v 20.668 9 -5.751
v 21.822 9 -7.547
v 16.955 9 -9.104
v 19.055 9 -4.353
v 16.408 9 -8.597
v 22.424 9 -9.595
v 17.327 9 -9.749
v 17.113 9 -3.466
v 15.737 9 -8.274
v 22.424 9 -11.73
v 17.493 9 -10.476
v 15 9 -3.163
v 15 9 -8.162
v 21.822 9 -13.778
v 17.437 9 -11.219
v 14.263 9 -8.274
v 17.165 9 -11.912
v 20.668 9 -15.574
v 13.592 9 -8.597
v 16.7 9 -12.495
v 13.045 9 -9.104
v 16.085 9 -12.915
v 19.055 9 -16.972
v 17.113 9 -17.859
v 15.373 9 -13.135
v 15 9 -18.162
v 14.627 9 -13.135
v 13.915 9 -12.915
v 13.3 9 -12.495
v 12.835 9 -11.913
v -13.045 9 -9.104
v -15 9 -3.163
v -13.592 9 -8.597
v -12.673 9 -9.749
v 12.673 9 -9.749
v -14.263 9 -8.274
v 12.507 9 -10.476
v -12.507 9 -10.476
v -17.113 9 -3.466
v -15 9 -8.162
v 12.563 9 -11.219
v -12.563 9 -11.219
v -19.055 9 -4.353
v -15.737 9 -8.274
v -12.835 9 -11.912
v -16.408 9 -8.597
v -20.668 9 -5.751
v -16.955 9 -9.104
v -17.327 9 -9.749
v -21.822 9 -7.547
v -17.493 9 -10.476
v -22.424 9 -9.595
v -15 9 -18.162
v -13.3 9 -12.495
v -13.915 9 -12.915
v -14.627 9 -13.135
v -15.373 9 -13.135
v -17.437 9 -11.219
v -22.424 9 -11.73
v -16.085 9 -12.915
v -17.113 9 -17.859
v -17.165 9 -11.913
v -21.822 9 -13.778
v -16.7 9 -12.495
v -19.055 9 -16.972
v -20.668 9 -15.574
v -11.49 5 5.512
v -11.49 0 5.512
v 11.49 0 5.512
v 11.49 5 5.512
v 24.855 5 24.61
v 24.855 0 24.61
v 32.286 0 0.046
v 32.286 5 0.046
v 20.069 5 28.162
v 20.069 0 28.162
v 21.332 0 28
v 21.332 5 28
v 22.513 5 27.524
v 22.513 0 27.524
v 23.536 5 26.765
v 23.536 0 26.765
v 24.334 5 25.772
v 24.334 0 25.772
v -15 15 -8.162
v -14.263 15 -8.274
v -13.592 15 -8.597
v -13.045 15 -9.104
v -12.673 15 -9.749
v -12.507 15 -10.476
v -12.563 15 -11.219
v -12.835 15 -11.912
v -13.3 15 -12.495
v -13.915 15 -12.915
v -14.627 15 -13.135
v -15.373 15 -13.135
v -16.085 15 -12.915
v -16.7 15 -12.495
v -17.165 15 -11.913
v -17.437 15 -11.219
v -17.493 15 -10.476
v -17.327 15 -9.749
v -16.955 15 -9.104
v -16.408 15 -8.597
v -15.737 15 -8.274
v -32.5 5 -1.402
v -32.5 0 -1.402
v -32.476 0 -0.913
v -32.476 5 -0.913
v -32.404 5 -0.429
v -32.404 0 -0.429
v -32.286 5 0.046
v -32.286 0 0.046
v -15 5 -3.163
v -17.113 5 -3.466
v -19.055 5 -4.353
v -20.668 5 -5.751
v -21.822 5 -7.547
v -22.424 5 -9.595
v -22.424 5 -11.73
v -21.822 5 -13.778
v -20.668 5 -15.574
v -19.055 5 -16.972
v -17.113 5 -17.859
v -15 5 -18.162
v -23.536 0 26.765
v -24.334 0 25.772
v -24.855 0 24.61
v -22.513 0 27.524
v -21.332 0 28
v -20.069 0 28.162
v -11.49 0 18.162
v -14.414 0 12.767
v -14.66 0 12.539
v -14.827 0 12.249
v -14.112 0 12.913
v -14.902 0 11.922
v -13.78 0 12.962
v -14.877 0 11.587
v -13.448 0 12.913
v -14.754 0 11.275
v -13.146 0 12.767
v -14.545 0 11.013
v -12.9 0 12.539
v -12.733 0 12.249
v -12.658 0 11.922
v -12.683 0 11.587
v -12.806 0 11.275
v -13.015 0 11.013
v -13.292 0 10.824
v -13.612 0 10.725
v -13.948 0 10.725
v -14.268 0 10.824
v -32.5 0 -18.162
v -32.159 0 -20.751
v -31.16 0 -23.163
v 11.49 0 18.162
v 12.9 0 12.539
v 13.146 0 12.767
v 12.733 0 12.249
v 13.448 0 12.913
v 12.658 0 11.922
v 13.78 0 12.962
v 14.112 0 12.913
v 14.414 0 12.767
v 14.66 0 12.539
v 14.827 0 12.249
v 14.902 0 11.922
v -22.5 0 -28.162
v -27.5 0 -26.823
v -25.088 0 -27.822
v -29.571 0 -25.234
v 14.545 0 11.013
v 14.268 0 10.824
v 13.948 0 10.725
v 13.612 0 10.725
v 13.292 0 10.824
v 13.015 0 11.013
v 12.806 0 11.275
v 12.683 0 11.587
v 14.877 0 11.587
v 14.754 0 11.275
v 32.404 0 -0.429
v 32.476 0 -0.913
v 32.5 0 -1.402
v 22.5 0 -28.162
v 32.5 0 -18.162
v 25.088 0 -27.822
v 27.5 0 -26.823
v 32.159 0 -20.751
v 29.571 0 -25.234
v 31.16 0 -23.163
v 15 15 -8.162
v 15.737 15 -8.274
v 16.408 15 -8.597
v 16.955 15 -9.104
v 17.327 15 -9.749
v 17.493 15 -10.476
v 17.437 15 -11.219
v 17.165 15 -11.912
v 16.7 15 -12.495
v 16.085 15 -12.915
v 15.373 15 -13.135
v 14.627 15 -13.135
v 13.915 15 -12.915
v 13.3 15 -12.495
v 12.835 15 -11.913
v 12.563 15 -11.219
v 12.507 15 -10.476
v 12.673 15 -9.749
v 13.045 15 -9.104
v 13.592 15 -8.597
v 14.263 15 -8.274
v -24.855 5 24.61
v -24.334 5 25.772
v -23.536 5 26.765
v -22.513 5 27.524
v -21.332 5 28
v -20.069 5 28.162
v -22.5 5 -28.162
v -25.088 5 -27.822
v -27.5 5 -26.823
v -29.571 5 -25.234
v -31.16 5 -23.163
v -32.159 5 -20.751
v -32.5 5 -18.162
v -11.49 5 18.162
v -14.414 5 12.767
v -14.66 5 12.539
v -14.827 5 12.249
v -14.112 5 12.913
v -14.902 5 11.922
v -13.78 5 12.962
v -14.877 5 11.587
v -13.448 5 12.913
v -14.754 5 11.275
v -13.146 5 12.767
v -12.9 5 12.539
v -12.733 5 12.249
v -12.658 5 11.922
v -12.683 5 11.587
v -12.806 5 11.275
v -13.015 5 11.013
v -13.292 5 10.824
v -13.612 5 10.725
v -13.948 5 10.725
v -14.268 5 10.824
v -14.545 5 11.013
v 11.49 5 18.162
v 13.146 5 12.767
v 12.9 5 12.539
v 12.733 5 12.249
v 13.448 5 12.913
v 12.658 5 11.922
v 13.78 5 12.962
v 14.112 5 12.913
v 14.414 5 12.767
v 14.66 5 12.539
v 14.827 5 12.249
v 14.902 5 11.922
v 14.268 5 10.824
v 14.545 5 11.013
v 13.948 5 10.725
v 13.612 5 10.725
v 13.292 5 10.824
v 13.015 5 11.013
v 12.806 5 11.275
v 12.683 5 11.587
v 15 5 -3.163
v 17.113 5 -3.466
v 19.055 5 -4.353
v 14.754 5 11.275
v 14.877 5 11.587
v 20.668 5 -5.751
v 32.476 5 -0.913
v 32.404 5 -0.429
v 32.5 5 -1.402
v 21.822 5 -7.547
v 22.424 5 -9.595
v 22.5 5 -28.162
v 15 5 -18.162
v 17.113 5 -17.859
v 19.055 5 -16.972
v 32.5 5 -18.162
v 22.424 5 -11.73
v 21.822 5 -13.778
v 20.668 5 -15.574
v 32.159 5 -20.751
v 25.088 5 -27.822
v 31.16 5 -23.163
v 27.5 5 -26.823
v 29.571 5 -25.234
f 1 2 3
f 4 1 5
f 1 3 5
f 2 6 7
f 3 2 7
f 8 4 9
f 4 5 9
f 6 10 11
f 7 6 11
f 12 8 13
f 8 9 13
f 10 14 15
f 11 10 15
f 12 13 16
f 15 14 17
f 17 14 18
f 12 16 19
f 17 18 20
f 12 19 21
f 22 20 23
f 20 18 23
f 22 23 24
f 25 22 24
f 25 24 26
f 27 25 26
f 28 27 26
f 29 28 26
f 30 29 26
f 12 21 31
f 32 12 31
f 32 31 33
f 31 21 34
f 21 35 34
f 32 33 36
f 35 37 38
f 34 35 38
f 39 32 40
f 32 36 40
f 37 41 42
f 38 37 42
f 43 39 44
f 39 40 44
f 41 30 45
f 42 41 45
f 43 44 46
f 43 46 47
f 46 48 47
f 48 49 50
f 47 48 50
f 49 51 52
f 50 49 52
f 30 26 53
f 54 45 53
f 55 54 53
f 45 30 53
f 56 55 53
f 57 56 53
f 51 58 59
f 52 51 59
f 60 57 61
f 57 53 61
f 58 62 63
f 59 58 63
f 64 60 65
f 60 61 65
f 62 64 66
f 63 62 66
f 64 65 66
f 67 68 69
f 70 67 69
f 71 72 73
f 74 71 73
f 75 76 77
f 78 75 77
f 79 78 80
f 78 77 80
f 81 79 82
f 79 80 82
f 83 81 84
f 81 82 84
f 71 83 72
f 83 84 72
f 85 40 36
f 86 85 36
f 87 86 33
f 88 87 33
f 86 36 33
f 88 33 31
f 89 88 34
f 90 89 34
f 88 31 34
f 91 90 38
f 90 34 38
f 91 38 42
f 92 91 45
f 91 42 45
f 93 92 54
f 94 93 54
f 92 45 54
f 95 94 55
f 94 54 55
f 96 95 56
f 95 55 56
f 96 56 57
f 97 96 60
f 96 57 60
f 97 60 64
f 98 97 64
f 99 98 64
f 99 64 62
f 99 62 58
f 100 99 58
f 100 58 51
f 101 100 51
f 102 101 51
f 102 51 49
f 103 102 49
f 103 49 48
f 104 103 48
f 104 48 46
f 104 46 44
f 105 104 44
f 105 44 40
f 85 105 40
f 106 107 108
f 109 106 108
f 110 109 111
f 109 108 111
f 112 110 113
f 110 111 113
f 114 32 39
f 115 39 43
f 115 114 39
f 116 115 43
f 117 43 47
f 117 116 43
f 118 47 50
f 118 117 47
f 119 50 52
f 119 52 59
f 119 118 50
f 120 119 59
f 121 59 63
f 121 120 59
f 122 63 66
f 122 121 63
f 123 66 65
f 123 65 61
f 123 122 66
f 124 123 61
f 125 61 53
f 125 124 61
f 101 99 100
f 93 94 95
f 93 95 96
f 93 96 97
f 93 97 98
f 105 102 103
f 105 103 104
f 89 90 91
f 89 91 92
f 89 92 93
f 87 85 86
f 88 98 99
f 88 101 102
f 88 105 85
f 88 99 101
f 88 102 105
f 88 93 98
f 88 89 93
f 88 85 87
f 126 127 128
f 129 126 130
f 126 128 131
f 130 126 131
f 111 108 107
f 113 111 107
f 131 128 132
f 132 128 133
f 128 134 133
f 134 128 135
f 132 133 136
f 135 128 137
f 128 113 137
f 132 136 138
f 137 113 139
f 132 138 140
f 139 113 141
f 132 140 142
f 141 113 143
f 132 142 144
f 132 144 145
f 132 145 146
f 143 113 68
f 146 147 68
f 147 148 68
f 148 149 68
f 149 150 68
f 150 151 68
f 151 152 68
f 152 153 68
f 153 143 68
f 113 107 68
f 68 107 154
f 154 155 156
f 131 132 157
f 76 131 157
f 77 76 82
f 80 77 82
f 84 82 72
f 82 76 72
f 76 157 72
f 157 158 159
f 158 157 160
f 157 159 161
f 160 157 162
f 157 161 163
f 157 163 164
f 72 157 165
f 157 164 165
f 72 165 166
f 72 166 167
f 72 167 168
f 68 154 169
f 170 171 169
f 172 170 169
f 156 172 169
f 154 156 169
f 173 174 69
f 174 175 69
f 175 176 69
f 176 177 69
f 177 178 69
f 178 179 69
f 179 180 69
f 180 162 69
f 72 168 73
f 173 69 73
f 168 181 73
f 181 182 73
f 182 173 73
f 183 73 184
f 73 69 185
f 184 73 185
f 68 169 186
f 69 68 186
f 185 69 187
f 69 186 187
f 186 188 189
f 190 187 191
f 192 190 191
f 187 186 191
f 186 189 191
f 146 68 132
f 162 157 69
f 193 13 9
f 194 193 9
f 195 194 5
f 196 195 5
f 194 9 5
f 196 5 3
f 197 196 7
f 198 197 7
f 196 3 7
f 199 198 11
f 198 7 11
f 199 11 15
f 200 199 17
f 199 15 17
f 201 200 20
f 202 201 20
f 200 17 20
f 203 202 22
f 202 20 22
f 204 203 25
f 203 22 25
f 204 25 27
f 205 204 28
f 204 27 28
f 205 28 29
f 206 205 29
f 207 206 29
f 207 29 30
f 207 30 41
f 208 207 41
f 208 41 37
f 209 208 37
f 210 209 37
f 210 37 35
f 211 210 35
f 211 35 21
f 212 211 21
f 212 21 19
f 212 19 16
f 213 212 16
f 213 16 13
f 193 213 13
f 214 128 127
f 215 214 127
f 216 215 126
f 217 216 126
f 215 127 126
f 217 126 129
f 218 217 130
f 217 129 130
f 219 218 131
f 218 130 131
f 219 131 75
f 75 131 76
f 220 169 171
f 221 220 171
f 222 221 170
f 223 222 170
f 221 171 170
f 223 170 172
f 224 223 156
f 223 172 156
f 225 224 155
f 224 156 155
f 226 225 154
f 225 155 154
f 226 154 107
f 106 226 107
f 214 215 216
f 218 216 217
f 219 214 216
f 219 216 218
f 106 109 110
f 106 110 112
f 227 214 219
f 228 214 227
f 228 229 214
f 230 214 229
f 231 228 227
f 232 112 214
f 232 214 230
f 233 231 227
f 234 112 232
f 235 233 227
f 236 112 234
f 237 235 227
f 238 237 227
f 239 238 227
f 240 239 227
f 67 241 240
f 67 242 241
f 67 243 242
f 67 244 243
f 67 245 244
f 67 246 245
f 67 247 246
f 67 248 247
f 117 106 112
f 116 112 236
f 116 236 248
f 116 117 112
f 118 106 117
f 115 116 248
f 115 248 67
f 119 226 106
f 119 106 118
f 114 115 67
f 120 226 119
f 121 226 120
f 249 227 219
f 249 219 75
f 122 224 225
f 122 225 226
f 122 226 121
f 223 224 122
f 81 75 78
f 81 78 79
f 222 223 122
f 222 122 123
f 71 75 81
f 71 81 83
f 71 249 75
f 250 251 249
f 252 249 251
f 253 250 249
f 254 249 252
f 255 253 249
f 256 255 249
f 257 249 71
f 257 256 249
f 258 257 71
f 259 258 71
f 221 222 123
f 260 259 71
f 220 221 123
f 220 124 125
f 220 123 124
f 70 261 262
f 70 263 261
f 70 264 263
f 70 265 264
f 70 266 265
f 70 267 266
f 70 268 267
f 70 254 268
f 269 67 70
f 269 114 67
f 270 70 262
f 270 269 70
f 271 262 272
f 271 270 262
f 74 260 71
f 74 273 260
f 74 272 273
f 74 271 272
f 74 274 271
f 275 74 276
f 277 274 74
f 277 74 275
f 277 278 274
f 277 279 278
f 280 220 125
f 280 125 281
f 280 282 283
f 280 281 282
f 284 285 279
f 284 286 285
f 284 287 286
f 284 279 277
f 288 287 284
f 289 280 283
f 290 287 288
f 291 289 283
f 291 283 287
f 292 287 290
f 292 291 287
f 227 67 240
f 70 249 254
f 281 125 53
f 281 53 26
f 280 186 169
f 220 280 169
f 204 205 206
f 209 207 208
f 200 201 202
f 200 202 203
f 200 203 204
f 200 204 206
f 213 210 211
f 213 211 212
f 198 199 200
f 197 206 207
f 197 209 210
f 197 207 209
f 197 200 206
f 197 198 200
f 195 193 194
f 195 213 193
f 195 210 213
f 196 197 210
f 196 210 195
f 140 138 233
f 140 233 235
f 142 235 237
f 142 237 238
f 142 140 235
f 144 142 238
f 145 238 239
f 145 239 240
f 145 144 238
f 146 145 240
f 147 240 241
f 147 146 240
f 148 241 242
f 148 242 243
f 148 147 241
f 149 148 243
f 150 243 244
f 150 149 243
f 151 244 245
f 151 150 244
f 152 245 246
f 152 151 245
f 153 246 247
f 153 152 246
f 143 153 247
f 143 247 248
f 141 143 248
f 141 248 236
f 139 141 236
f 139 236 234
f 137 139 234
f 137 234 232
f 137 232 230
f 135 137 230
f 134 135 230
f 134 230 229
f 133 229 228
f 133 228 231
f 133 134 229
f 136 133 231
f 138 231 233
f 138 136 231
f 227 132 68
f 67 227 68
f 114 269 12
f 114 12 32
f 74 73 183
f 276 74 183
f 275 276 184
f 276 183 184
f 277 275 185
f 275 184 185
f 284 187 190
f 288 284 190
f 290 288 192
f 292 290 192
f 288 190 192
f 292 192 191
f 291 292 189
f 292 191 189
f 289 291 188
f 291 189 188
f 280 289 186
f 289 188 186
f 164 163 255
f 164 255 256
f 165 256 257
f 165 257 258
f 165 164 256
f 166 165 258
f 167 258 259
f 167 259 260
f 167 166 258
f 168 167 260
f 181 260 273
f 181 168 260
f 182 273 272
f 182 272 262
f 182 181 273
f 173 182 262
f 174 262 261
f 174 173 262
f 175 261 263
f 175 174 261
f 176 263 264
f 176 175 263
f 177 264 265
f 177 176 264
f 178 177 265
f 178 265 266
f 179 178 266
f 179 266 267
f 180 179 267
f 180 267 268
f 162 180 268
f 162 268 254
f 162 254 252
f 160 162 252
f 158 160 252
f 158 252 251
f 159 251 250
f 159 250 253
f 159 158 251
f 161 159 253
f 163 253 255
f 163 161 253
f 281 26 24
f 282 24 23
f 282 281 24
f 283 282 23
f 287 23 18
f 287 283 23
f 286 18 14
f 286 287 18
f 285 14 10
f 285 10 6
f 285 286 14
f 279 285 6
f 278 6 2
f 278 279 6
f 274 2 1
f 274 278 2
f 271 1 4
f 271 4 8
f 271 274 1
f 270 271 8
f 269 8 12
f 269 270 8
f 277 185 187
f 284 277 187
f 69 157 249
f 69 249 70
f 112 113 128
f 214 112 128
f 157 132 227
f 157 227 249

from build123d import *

# Parameters (mm, degrees)
SKETCH1_R           = 1.125
SKETCH1_W           = 22.98
SKETCH1_H           = 12.65
BOSS_EXTRUDE1_DEPTH = 5
SKETCH1_3_R         = 2.5
BOSS_EXTRUDE2_DEPTH = 9
SKETCH1_4_R         = 2.5
BOSS_EXTRUDE3_DEPTH = 15


with BuildPart() as part:
    # Sketch1 → Boss-Extrude1 (new body)
    with BuildSketch(Plane(origin=(0, 0, 0), x_dir=(1, 0, 0), z_dir=(0, 1, 0))):
        with BuildLine():
            Line((-32.5, 18.1625), (-32.5, 1.402234115))
            ThreePointArc((-32.5, 1.402234115), (-32.446161571, 0.670465224), (-32.285805716, -0.045544752))
            Line((-32.285805716, -0.045544752), (-24.854600808, -24.610278867))
            ThreePointArc((-24.854600808, -24.610278867), (-23.048820734, -27.177403133), (-20.068795092, -28.1625))
            Line((-20.068795092, -28.1625), (20.068795092, -28.1625))
            ThreePointArc((20.068795092, -28.1625), (23.048820734, -27.177403133), (24.854600808, -24.610278867))
            Line((24.854600808, -24.610278867), (32.285805716, -0.045544752))
            ThreePointArc((32.285805716, -0.045544752), (32.446161571, 0.670465224), (32.5, 1.402234115))
            Line((32.5, 1.402234115), (32.5, 18.1625))
            ThreePointArc((32.5, 18.1625), (29.571067812, 25.233567812), (22.5, 28.1625))
            Line((22.5, 28.1625), (-22.5, 28.1625))
            ThreePointArc((-22.5, 28.1625), (-29.571067812, 25.233567812), (-32.5, 18.1625))
        make_face()
        with Locations((-13.78, -11.8375)):
            Circle(SKETCH1_R, mode=Mode.SUBTRACT)
        with Locations((0, -11.8375)):
            Rectangle(SKETCH1_W, SKETCH1_H, mode=Mode.SUBTRACT)
        with Locations((13.78, -11.8375)):
            Circle(SKETCH1_R, mode=Mode.SUBTRACT)
        with BuildLine():
            Line((-15, 18.1625), (15, 18.1625))
            ThreePointArc((15, 18.1625), (22.5, 10.6625), (15, 3.1625))
            Line((15, 3.1625), (-15, 3.1625))
            ThreePointArc((-15, 3.1625), (-22.5, 10.6625), (-15, 18.1625))
        make_face(mode=Mode.SUBTRACT)
    extrude(amount=BOSS_EXTRUDE1_DEPTH)

    # Sketch1<3> → Boss-Extrude2 (add)
    with BuildSketch(Plane(origin=(0, 0, 0), x_dir=(1, 0, 0), z_dir=(0, 1, 0))):
        with BuildLine():
            ThreePointArc((15, 3.1625), (22.5, 10.6625), (15, 18.1625))
            Line((15, 18.1625), (-15, 18.1625))
            ThreePointArc((-15, 18.1625), (-22.5, 10.6625), (-15, 3.1625))
            Line((-15, 3.1625), (15, 3.1625))
        make_face()
        with Locations((-15, 10.6625)):
            Circle(SKETCH1_3_R, mode=Mode.SUBTRACT)
        with Locations((15, 10.6625)):
            Circle(SKETCH1_3_R, mode=Mode.SUBTRACT)
    extrude(amount=BOSS_EXTRUDE2_DEPTH)

    # Sketch1<4> → Boss-Extrude3 (add)
    with BuildSketch(Plane(origin=(0, 0, 0), x_dir=(1, 0, 0), z_dir=(0, 1, 0))):
        with Locations((-15, 10.6625)):
            Circle(SKETCH1_4_R)
        with Locations((15, 10.6625)):
            Circle(SKETCH1_4_R)
    extrude(amount=BOSS_EXTRUDE3_DEPTH)


solid = part.part
